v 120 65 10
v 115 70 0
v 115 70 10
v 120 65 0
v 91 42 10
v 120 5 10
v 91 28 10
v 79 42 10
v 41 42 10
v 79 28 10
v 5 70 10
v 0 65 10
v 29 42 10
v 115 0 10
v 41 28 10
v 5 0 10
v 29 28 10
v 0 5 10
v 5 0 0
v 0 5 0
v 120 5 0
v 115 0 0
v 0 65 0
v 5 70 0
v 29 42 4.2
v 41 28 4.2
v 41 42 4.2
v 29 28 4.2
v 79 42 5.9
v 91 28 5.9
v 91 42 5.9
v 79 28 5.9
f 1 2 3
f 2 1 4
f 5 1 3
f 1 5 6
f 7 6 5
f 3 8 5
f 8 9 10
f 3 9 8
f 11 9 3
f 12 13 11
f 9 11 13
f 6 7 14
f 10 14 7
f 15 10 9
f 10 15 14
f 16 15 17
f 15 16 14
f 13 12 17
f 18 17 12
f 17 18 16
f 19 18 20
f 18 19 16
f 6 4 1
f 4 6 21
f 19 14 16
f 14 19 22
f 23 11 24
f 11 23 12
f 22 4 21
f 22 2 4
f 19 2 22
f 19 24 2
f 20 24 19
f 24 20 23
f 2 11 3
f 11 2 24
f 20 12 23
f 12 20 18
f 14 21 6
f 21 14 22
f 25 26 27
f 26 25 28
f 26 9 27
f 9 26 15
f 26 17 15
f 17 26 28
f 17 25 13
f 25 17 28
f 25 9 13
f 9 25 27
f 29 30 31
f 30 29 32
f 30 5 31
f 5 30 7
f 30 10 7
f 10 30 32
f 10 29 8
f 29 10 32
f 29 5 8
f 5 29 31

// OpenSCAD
$fn = 32;

// ----------------------------------------------------------------------
// Windowed plate: 2 voids, 120 x 70 x 10 mm
// ----------------------------------------------------------------------

// --- parameters (mm) ---
plate_l = 120;            // plate length, X
plate_w = 70;             // plate width, Y
plate_t = 10;             // plate thickness, Z
edge_margin = 10;         // wall from the plate edge to any window
windows = 2;              // number of windows in the row
win_l = 12;               // window length
win_w = 14;               // window width
win_pitch = 50;           // window pitch along X
depth_1 = 5.8;            // depth of void 1 (full thickness = through)
depth_2 = 4.1;            // depth of void 2 (full thickness = through)
corner_c = 5;             // corner chamfer of the plate

profile = [[5, 0], [115, 0], [120, 5], [120, 65], [115, 70], [5, 70], [0, 65], [0, 5]];  // primary outline, 8 points, counter clockwise
void_1 = [[29, 28], [41, 28], [41, 42], [29, 42]];  // window 1 of the row, 4 points
void_2 = [[79, 28], [91, 28], [91, 42], [79, 42]];  // window 2 of the row, 4 points

// --- the one profile operation ---
difference() {
  linear_extrude(height = plate_t) polygon(points = profile);
  translate([0, 0, plate_t - depth_1])
    linear_extrude(height = depth_1 + 1) polygon(points = void_1);
  translate([0, 0, plate_t - depth_2])
    linear_extrude(height = depth_2 + 1) polygon(points = void_2);
}
